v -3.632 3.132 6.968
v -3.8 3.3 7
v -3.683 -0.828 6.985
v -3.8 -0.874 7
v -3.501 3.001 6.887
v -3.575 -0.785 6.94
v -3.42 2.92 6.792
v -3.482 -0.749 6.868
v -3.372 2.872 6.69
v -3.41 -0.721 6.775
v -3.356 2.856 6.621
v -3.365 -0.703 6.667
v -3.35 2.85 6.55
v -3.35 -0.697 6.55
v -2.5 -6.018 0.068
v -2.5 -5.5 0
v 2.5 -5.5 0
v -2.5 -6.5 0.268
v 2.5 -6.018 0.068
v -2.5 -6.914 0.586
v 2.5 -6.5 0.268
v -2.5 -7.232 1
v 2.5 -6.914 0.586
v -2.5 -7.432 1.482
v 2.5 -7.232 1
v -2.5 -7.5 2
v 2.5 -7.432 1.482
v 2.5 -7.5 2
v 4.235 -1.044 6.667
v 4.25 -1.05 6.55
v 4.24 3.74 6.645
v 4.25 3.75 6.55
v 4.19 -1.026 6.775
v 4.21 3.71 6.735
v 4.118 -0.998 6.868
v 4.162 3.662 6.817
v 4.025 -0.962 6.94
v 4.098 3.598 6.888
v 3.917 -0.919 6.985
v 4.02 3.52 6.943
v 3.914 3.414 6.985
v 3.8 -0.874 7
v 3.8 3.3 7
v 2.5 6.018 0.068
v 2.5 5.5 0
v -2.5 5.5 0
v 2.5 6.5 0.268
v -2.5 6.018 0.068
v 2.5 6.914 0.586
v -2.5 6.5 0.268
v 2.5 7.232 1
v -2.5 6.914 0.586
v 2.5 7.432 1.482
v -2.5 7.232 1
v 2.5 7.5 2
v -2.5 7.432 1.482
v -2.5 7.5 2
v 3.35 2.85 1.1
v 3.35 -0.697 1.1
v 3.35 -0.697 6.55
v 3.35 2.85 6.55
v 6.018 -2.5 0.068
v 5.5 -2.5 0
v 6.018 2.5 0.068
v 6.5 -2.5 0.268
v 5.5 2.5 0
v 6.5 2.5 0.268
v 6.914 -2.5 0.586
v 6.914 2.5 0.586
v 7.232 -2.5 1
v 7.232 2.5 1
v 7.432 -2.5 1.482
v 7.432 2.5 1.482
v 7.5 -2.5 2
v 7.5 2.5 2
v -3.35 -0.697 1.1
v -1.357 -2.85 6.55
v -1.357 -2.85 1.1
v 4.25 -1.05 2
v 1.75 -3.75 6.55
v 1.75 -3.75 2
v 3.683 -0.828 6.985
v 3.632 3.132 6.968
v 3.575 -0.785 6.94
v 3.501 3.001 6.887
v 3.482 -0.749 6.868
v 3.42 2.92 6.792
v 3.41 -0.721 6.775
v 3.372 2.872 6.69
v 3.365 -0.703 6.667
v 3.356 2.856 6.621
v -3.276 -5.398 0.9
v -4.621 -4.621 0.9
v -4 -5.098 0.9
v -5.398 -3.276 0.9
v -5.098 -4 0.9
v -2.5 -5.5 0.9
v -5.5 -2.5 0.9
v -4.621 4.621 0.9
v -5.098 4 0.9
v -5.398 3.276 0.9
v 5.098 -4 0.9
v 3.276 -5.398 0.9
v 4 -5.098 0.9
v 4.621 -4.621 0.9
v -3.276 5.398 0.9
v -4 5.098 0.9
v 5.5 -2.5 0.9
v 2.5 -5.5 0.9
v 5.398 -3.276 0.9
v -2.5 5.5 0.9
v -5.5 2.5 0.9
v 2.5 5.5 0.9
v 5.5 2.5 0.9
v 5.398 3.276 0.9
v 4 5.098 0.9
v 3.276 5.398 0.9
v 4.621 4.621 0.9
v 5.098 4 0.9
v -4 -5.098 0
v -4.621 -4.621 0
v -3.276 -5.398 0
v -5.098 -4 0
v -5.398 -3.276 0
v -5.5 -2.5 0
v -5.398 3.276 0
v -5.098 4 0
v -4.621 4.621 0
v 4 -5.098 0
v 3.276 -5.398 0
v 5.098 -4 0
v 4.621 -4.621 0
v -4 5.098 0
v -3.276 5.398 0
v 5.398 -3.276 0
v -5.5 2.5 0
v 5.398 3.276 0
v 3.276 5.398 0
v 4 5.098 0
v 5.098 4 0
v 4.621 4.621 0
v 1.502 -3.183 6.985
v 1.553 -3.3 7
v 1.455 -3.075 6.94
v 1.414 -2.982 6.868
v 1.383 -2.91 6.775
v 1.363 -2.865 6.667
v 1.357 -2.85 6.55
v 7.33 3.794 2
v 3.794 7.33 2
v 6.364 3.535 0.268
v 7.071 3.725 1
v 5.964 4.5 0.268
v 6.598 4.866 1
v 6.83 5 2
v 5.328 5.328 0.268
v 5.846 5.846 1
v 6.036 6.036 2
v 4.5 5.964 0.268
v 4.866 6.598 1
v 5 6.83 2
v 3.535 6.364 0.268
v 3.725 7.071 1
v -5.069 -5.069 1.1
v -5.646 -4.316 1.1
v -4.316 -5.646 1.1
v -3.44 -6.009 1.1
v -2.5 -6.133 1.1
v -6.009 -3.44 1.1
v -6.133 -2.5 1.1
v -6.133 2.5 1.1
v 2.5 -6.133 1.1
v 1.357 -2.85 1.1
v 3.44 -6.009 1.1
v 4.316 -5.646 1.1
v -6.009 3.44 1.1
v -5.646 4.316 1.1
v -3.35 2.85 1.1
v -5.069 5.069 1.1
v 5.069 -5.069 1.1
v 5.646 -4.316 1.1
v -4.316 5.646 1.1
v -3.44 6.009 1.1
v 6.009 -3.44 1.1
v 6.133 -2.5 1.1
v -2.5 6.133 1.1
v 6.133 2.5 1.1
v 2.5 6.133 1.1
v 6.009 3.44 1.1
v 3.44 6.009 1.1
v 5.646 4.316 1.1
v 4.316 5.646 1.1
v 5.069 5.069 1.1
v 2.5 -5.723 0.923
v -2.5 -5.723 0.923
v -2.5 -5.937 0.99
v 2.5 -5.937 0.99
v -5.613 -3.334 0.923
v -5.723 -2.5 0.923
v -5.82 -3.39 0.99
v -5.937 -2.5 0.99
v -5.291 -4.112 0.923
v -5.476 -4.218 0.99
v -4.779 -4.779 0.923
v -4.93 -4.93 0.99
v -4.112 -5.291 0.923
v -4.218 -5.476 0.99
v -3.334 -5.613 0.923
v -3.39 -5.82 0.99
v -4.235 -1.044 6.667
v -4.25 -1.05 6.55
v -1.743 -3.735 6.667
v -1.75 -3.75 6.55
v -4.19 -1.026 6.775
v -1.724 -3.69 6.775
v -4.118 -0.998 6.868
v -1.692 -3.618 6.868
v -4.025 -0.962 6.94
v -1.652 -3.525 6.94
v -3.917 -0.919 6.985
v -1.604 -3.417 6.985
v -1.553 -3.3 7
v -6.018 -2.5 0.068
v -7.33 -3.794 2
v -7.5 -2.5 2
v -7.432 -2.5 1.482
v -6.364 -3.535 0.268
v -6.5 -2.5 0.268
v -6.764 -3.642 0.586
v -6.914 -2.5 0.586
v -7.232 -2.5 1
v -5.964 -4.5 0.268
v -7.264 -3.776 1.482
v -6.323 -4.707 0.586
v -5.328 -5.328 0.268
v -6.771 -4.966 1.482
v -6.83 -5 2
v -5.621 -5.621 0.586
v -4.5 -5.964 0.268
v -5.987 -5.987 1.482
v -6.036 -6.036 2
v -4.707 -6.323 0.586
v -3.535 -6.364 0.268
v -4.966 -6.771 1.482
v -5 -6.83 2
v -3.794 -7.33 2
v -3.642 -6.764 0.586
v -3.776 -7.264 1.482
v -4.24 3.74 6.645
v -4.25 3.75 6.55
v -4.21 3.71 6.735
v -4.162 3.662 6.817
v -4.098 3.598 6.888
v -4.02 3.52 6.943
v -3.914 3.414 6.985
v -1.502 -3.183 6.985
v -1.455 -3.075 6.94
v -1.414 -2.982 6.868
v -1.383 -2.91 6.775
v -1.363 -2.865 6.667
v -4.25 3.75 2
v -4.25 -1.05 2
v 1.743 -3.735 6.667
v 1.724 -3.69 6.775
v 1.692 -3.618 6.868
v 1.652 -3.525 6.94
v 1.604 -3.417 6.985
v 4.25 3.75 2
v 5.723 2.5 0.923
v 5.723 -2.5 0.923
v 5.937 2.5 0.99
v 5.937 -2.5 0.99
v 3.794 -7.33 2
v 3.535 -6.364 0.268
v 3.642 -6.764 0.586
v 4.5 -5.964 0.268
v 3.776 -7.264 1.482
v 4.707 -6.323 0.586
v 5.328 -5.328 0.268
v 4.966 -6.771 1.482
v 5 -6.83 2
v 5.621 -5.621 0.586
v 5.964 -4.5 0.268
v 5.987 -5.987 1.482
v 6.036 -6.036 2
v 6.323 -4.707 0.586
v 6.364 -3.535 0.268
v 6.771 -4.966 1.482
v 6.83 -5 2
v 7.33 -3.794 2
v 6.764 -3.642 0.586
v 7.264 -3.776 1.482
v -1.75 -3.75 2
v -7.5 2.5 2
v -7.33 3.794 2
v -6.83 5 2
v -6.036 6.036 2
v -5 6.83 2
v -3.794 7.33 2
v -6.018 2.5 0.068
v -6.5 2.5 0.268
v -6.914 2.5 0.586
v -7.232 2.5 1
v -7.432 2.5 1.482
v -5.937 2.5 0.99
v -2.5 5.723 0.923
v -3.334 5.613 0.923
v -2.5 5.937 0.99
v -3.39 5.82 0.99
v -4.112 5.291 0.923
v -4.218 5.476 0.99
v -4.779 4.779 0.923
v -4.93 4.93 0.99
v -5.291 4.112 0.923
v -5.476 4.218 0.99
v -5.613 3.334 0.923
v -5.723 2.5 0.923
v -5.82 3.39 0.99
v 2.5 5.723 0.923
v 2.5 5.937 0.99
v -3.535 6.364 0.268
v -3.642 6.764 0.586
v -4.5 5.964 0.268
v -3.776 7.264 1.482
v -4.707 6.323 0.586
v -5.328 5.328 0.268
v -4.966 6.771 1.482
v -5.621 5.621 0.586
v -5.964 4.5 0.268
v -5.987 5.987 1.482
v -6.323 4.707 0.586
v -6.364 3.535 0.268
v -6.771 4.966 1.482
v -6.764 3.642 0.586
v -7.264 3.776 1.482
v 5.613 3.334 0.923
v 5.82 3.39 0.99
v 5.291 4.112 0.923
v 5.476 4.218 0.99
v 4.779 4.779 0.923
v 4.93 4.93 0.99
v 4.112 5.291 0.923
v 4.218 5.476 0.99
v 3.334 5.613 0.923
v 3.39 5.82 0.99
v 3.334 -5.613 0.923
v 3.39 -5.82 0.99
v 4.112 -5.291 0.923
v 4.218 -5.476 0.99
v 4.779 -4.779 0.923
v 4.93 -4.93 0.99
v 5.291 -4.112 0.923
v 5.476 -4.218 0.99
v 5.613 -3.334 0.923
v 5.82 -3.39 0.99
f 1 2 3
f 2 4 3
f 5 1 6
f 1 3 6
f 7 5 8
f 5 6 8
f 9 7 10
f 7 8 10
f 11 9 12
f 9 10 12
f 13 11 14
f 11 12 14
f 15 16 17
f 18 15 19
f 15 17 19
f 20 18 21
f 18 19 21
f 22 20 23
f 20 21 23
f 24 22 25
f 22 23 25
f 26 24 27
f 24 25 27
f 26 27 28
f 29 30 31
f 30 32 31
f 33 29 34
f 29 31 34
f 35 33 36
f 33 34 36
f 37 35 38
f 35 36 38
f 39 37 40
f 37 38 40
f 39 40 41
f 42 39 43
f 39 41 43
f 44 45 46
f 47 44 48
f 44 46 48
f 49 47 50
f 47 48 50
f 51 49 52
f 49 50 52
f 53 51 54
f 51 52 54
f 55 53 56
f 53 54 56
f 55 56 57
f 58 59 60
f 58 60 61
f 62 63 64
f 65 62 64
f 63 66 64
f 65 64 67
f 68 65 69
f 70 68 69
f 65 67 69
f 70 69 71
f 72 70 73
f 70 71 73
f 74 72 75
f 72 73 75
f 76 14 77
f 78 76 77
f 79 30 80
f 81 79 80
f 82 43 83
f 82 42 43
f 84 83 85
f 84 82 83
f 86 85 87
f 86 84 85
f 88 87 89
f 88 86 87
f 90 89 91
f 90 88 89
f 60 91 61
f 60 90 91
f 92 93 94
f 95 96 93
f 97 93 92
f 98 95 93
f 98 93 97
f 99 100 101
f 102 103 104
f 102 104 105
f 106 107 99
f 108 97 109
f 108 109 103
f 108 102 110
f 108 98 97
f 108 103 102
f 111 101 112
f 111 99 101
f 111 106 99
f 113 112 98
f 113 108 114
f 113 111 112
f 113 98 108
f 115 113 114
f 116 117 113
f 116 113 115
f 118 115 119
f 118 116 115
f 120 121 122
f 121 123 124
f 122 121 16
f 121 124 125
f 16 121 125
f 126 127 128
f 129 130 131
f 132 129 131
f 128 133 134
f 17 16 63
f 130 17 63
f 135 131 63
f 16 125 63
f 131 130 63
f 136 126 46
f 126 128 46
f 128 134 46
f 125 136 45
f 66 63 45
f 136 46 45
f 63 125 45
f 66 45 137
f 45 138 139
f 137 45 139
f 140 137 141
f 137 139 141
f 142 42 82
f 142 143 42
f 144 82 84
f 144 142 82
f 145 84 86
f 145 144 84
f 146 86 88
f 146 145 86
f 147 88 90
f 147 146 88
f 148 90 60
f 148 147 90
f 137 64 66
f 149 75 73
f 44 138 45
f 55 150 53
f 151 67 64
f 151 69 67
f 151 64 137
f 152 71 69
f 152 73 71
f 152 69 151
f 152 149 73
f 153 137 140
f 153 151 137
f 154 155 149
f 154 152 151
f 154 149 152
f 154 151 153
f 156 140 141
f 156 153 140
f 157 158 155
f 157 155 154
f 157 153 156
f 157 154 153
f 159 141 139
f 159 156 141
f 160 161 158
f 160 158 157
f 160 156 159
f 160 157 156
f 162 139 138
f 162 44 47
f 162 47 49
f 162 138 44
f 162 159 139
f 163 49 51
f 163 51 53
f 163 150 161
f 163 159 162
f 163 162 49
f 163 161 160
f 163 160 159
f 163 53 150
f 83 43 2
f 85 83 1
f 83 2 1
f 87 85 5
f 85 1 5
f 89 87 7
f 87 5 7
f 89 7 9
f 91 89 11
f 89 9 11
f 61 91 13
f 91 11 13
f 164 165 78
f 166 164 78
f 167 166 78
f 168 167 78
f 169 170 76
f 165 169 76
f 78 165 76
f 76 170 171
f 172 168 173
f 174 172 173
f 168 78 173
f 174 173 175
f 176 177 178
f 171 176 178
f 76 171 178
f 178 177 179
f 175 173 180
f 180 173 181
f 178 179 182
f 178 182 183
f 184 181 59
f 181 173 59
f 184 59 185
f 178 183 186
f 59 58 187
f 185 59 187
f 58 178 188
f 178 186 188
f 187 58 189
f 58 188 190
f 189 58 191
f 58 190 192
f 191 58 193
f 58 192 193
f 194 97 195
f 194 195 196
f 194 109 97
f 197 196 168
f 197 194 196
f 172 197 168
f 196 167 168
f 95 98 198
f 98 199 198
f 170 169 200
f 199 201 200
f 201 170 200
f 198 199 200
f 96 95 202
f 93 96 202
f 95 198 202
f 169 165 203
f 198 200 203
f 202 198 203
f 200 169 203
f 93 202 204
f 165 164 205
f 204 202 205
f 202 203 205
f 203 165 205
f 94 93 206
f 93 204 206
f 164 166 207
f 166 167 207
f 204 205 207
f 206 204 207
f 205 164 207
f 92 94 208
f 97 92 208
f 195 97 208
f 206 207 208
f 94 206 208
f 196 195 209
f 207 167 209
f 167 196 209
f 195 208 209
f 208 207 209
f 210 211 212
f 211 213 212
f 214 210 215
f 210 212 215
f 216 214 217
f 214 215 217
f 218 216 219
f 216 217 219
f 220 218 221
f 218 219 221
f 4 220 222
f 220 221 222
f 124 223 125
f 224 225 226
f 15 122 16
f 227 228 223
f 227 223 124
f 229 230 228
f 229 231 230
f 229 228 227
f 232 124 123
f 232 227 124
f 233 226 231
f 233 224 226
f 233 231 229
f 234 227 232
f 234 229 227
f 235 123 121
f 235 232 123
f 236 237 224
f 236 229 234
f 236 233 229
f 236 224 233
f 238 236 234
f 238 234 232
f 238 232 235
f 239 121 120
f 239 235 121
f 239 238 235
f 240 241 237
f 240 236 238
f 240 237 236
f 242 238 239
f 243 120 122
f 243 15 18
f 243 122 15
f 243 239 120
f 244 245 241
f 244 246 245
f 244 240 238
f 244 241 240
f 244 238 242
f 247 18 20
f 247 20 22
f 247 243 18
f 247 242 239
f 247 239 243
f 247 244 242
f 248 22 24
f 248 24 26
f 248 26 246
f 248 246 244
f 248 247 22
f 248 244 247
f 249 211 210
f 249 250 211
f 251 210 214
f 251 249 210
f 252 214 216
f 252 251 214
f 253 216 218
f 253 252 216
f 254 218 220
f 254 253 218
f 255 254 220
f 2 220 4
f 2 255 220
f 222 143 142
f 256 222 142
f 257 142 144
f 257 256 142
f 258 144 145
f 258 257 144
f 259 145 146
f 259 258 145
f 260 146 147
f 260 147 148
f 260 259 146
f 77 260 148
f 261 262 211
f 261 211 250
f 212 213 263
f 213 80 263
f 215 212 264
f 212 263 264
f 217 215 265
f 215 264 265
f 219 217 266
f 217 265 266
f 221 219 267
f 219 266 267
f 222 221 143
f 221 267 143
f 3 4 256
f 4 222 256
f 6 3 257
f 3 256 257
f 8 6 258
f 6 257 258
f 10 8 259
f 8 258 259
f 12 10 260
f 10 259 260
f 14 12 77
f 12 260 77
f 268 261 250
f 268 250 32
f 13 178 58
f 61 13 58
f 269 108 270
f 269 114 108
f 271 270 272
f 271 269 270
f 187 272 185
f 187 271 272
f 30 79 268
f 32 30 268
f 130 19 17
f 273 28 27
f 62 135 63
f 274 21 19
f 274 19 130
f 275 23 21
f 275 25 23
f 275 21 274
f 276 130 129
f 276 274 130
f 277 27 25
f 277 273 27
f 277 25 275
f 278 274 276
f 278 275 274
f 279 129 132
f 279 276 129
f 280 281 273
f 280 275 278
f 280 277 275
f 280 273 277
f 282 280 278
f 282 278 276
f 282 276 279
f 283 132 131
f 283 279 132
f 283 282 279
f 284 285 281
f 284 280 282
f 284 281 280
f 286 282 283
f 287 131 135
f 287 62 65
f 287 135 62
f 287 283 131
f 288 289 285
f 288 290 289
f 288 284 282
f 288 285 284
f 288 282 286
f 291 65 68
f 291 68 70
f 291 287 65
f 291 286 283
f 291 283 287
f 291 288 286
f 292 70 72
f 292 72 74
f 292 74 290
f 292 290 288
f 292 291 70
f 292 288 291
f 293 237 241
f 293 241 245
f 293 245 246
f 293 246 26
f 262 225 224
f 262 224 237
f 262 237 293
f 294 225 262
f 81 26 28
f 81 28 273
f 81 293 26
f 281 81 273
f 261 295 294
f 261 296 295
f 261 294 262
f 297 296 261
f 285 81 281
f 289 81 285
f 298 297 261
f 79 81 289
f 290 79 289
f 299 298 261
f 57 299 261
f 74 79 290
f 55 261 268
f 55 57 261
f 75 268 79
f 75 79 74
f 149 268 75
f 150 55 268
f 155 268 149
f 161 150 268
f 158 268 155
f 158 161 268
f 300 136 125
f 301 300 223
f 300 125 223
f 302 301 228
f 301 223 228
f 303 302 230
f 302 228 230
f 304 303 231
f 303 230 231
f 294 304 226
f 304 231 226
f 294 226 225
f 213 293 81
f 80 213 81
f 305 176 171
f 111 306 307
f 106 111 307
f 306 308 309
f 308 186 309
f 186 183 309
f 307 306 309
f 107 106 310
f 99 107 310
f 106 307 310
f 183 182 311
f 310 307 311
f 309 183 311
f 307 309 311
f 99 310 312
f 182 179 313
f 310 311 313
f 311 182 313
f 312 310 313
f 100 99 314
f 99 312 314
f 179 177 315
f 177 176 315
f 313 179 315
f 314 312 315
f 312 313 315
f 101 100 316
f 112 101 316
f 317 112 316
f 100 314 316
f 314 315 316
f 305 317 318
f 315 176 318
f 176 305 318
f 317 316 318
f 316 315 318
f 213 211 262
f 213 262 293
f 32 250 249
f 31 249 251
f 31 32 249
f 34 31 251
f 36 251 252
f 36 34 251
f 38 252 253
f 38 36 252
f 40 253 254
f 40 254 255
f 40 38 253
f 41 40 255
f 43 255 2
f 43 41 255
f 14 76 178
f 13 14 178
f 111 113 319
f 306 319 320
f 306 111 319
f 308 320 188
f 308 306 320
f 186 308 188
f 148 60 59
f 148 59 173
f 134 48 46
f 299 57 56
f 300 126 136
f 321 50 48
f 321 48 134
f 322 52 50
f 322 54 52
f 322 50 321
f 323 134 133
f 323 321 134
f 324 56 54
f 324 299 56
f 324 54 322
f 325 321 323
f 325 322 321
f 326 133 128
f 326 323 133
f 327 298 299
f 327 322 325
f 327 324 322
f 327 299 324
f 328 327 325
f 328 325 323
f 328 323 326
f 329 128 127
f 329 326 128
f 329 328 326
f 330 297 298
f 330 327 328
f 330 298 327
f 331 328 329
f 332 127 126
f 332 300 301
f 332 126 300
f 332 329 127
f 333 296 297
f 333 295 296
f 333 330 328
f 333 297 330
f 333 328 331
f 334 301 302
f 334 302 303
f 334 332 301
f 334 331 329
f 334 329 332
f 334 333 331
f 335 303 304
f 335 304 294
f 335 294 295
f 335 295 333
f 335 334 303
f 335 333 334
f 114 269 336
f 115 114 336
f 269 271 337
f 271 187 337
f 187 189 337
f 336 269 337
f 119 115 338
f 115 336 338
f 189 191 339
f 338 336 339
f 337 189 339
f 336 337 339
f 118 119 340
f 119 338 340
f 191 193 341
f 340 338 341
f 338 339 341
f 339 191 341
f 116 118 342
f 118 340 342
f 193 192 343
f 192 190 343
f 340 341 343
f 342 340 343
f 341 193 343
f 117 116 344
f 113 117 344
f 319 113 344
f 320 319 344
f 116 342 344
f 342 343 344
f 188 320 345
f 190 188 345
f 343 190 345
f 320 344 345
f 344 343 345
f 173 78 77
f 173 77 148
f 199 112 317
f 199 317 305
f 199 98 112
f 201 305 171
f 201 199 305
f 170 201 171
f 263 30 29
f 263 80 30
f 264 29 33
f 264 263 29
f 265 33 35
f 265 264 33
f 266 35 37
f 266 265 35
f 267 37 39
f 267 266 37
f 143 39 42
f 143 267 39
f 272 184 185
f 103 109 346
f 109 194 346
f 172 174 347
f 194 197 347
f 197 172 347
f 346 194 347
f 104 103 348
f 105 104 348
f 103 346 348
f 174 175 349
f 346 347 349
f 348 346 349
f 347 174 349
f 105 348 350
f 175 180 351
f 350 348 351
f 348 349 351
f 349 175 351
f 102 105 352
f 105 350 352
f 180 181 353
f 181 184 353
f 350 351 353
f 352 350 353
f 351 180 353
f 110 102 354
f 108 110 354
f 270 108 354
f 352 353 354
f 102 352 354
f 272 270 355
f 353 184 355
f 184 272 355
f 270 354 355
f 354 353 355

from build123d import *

# Parameters (mm, degrees)
SKETCH1_W           = 15
SKETCH1_H           = 15
BOSS_EXTRUDE1_DEPTH = 2
FILLET11_R          = 5
FILLET13_R          = 2
SKETCH7_W           = 8.5
SKETCH7_H           = 7.5
BOSS_EXTRUDE5_DEPTH = 5
CUT_EXTRUDE3_DEPTH  = 5
SHELL8_T            = -0.9
FILLET15_R          = 0.45


with BuildPart() as part:
    # Sketch1 → Boss-Extrude1 (new body)
    with BuildSketch(Plane.XY):
        Rectangle(SKETCH1_W, SKETCH1_H)
    extrude(amount=BOSS_EXTRUDE1_DEPTH)

    # Fillet11
    fillet11_edges = [part.edges().sort_by_distance(p)[0] for p in [
        (7.5, -7.5, 1),
        (-7.5, -7.5, 1),
        (-7.5, 7.5, 1),
        (7.5, 7.5, 1),
    ]]
    fillet(fillet11_edges, radius=FILLET11_R)

    # Fillet13
    fillet13_edges = [part.edges().sort_by_distance(p)[0] for p in [
        (6.035533906, 6.035533906, 0),
        (0, 7.5, 0),
        (-6.035533906, 6.035533906, 0),
        (-7.5, 0, 0),
        (-6.035533906, -6.035533906, 0),
        (0, -7.5, 0),
        (6.035533906, -6.035533906, 0),
        (7.5, 0, 0),
    ]]
    fillet(fillet13_edges, radius=FILLET13_R - 0.0001)  # a hair under: the kernel refuses the full size

    # Sketch7 → Boss-Extrude5 (add)
    with BuildSketch(Plane.XY.offset(2)):
        Rectangle(SKETCH7_W, SKETCH7_H)
    extrude(amount=BOSS_EXTRUDE5_DEPTH)

    # Sketch8 → Cut-Extrude3 (cut)
    with BuildSketch(Plane.XY.offset(7)):
        Polygon((-4.25, -1.05), (-1.75, -3.75), (-4.25, -3.75), align=None)
        Polygon((4.25, -1.05), (1.75, -3.75), (4.25, -3.75), align=None)
    extrude(amount=-CUT_EXTRUDE3_DEPTH, mode=Mode.SUBTRACT)

    # Shell8
    shell8_openings = [part.faces().sort_by_distance(p)[0] for p in [
        (0, 0.3375, 7),
    ]]
    offset(amount=SHELL8_T, openings=shell8_openings, kind=Kind.INTERSECTION)

    # Fillet15
    fillet15_edges = [part.edges().sort_by_distance(p)[0] for p in [
        (0, 2.85, 7),
        (2.353387684, -1.773658698, 7),
        (-2.353387684, -1.773658698, 7),
        (0, 3.75, 7),
        (-4.25, 1.35, 7),
        (4.25, 1.35, 7),
        (0, -3.75, 7),
        (-3, -2.4, 7),
        (3, -2.4, 7),
        (-3.35, 1.076341302, 7),
        (0, -2.85, 7),
        (3.35, 1.076341302, 7),
    ]]
    fillet(fillet15_edges, radius=FILLET15_R - 0.0001)  # a hair under: the kernel refuses the full size


solid = part.part
